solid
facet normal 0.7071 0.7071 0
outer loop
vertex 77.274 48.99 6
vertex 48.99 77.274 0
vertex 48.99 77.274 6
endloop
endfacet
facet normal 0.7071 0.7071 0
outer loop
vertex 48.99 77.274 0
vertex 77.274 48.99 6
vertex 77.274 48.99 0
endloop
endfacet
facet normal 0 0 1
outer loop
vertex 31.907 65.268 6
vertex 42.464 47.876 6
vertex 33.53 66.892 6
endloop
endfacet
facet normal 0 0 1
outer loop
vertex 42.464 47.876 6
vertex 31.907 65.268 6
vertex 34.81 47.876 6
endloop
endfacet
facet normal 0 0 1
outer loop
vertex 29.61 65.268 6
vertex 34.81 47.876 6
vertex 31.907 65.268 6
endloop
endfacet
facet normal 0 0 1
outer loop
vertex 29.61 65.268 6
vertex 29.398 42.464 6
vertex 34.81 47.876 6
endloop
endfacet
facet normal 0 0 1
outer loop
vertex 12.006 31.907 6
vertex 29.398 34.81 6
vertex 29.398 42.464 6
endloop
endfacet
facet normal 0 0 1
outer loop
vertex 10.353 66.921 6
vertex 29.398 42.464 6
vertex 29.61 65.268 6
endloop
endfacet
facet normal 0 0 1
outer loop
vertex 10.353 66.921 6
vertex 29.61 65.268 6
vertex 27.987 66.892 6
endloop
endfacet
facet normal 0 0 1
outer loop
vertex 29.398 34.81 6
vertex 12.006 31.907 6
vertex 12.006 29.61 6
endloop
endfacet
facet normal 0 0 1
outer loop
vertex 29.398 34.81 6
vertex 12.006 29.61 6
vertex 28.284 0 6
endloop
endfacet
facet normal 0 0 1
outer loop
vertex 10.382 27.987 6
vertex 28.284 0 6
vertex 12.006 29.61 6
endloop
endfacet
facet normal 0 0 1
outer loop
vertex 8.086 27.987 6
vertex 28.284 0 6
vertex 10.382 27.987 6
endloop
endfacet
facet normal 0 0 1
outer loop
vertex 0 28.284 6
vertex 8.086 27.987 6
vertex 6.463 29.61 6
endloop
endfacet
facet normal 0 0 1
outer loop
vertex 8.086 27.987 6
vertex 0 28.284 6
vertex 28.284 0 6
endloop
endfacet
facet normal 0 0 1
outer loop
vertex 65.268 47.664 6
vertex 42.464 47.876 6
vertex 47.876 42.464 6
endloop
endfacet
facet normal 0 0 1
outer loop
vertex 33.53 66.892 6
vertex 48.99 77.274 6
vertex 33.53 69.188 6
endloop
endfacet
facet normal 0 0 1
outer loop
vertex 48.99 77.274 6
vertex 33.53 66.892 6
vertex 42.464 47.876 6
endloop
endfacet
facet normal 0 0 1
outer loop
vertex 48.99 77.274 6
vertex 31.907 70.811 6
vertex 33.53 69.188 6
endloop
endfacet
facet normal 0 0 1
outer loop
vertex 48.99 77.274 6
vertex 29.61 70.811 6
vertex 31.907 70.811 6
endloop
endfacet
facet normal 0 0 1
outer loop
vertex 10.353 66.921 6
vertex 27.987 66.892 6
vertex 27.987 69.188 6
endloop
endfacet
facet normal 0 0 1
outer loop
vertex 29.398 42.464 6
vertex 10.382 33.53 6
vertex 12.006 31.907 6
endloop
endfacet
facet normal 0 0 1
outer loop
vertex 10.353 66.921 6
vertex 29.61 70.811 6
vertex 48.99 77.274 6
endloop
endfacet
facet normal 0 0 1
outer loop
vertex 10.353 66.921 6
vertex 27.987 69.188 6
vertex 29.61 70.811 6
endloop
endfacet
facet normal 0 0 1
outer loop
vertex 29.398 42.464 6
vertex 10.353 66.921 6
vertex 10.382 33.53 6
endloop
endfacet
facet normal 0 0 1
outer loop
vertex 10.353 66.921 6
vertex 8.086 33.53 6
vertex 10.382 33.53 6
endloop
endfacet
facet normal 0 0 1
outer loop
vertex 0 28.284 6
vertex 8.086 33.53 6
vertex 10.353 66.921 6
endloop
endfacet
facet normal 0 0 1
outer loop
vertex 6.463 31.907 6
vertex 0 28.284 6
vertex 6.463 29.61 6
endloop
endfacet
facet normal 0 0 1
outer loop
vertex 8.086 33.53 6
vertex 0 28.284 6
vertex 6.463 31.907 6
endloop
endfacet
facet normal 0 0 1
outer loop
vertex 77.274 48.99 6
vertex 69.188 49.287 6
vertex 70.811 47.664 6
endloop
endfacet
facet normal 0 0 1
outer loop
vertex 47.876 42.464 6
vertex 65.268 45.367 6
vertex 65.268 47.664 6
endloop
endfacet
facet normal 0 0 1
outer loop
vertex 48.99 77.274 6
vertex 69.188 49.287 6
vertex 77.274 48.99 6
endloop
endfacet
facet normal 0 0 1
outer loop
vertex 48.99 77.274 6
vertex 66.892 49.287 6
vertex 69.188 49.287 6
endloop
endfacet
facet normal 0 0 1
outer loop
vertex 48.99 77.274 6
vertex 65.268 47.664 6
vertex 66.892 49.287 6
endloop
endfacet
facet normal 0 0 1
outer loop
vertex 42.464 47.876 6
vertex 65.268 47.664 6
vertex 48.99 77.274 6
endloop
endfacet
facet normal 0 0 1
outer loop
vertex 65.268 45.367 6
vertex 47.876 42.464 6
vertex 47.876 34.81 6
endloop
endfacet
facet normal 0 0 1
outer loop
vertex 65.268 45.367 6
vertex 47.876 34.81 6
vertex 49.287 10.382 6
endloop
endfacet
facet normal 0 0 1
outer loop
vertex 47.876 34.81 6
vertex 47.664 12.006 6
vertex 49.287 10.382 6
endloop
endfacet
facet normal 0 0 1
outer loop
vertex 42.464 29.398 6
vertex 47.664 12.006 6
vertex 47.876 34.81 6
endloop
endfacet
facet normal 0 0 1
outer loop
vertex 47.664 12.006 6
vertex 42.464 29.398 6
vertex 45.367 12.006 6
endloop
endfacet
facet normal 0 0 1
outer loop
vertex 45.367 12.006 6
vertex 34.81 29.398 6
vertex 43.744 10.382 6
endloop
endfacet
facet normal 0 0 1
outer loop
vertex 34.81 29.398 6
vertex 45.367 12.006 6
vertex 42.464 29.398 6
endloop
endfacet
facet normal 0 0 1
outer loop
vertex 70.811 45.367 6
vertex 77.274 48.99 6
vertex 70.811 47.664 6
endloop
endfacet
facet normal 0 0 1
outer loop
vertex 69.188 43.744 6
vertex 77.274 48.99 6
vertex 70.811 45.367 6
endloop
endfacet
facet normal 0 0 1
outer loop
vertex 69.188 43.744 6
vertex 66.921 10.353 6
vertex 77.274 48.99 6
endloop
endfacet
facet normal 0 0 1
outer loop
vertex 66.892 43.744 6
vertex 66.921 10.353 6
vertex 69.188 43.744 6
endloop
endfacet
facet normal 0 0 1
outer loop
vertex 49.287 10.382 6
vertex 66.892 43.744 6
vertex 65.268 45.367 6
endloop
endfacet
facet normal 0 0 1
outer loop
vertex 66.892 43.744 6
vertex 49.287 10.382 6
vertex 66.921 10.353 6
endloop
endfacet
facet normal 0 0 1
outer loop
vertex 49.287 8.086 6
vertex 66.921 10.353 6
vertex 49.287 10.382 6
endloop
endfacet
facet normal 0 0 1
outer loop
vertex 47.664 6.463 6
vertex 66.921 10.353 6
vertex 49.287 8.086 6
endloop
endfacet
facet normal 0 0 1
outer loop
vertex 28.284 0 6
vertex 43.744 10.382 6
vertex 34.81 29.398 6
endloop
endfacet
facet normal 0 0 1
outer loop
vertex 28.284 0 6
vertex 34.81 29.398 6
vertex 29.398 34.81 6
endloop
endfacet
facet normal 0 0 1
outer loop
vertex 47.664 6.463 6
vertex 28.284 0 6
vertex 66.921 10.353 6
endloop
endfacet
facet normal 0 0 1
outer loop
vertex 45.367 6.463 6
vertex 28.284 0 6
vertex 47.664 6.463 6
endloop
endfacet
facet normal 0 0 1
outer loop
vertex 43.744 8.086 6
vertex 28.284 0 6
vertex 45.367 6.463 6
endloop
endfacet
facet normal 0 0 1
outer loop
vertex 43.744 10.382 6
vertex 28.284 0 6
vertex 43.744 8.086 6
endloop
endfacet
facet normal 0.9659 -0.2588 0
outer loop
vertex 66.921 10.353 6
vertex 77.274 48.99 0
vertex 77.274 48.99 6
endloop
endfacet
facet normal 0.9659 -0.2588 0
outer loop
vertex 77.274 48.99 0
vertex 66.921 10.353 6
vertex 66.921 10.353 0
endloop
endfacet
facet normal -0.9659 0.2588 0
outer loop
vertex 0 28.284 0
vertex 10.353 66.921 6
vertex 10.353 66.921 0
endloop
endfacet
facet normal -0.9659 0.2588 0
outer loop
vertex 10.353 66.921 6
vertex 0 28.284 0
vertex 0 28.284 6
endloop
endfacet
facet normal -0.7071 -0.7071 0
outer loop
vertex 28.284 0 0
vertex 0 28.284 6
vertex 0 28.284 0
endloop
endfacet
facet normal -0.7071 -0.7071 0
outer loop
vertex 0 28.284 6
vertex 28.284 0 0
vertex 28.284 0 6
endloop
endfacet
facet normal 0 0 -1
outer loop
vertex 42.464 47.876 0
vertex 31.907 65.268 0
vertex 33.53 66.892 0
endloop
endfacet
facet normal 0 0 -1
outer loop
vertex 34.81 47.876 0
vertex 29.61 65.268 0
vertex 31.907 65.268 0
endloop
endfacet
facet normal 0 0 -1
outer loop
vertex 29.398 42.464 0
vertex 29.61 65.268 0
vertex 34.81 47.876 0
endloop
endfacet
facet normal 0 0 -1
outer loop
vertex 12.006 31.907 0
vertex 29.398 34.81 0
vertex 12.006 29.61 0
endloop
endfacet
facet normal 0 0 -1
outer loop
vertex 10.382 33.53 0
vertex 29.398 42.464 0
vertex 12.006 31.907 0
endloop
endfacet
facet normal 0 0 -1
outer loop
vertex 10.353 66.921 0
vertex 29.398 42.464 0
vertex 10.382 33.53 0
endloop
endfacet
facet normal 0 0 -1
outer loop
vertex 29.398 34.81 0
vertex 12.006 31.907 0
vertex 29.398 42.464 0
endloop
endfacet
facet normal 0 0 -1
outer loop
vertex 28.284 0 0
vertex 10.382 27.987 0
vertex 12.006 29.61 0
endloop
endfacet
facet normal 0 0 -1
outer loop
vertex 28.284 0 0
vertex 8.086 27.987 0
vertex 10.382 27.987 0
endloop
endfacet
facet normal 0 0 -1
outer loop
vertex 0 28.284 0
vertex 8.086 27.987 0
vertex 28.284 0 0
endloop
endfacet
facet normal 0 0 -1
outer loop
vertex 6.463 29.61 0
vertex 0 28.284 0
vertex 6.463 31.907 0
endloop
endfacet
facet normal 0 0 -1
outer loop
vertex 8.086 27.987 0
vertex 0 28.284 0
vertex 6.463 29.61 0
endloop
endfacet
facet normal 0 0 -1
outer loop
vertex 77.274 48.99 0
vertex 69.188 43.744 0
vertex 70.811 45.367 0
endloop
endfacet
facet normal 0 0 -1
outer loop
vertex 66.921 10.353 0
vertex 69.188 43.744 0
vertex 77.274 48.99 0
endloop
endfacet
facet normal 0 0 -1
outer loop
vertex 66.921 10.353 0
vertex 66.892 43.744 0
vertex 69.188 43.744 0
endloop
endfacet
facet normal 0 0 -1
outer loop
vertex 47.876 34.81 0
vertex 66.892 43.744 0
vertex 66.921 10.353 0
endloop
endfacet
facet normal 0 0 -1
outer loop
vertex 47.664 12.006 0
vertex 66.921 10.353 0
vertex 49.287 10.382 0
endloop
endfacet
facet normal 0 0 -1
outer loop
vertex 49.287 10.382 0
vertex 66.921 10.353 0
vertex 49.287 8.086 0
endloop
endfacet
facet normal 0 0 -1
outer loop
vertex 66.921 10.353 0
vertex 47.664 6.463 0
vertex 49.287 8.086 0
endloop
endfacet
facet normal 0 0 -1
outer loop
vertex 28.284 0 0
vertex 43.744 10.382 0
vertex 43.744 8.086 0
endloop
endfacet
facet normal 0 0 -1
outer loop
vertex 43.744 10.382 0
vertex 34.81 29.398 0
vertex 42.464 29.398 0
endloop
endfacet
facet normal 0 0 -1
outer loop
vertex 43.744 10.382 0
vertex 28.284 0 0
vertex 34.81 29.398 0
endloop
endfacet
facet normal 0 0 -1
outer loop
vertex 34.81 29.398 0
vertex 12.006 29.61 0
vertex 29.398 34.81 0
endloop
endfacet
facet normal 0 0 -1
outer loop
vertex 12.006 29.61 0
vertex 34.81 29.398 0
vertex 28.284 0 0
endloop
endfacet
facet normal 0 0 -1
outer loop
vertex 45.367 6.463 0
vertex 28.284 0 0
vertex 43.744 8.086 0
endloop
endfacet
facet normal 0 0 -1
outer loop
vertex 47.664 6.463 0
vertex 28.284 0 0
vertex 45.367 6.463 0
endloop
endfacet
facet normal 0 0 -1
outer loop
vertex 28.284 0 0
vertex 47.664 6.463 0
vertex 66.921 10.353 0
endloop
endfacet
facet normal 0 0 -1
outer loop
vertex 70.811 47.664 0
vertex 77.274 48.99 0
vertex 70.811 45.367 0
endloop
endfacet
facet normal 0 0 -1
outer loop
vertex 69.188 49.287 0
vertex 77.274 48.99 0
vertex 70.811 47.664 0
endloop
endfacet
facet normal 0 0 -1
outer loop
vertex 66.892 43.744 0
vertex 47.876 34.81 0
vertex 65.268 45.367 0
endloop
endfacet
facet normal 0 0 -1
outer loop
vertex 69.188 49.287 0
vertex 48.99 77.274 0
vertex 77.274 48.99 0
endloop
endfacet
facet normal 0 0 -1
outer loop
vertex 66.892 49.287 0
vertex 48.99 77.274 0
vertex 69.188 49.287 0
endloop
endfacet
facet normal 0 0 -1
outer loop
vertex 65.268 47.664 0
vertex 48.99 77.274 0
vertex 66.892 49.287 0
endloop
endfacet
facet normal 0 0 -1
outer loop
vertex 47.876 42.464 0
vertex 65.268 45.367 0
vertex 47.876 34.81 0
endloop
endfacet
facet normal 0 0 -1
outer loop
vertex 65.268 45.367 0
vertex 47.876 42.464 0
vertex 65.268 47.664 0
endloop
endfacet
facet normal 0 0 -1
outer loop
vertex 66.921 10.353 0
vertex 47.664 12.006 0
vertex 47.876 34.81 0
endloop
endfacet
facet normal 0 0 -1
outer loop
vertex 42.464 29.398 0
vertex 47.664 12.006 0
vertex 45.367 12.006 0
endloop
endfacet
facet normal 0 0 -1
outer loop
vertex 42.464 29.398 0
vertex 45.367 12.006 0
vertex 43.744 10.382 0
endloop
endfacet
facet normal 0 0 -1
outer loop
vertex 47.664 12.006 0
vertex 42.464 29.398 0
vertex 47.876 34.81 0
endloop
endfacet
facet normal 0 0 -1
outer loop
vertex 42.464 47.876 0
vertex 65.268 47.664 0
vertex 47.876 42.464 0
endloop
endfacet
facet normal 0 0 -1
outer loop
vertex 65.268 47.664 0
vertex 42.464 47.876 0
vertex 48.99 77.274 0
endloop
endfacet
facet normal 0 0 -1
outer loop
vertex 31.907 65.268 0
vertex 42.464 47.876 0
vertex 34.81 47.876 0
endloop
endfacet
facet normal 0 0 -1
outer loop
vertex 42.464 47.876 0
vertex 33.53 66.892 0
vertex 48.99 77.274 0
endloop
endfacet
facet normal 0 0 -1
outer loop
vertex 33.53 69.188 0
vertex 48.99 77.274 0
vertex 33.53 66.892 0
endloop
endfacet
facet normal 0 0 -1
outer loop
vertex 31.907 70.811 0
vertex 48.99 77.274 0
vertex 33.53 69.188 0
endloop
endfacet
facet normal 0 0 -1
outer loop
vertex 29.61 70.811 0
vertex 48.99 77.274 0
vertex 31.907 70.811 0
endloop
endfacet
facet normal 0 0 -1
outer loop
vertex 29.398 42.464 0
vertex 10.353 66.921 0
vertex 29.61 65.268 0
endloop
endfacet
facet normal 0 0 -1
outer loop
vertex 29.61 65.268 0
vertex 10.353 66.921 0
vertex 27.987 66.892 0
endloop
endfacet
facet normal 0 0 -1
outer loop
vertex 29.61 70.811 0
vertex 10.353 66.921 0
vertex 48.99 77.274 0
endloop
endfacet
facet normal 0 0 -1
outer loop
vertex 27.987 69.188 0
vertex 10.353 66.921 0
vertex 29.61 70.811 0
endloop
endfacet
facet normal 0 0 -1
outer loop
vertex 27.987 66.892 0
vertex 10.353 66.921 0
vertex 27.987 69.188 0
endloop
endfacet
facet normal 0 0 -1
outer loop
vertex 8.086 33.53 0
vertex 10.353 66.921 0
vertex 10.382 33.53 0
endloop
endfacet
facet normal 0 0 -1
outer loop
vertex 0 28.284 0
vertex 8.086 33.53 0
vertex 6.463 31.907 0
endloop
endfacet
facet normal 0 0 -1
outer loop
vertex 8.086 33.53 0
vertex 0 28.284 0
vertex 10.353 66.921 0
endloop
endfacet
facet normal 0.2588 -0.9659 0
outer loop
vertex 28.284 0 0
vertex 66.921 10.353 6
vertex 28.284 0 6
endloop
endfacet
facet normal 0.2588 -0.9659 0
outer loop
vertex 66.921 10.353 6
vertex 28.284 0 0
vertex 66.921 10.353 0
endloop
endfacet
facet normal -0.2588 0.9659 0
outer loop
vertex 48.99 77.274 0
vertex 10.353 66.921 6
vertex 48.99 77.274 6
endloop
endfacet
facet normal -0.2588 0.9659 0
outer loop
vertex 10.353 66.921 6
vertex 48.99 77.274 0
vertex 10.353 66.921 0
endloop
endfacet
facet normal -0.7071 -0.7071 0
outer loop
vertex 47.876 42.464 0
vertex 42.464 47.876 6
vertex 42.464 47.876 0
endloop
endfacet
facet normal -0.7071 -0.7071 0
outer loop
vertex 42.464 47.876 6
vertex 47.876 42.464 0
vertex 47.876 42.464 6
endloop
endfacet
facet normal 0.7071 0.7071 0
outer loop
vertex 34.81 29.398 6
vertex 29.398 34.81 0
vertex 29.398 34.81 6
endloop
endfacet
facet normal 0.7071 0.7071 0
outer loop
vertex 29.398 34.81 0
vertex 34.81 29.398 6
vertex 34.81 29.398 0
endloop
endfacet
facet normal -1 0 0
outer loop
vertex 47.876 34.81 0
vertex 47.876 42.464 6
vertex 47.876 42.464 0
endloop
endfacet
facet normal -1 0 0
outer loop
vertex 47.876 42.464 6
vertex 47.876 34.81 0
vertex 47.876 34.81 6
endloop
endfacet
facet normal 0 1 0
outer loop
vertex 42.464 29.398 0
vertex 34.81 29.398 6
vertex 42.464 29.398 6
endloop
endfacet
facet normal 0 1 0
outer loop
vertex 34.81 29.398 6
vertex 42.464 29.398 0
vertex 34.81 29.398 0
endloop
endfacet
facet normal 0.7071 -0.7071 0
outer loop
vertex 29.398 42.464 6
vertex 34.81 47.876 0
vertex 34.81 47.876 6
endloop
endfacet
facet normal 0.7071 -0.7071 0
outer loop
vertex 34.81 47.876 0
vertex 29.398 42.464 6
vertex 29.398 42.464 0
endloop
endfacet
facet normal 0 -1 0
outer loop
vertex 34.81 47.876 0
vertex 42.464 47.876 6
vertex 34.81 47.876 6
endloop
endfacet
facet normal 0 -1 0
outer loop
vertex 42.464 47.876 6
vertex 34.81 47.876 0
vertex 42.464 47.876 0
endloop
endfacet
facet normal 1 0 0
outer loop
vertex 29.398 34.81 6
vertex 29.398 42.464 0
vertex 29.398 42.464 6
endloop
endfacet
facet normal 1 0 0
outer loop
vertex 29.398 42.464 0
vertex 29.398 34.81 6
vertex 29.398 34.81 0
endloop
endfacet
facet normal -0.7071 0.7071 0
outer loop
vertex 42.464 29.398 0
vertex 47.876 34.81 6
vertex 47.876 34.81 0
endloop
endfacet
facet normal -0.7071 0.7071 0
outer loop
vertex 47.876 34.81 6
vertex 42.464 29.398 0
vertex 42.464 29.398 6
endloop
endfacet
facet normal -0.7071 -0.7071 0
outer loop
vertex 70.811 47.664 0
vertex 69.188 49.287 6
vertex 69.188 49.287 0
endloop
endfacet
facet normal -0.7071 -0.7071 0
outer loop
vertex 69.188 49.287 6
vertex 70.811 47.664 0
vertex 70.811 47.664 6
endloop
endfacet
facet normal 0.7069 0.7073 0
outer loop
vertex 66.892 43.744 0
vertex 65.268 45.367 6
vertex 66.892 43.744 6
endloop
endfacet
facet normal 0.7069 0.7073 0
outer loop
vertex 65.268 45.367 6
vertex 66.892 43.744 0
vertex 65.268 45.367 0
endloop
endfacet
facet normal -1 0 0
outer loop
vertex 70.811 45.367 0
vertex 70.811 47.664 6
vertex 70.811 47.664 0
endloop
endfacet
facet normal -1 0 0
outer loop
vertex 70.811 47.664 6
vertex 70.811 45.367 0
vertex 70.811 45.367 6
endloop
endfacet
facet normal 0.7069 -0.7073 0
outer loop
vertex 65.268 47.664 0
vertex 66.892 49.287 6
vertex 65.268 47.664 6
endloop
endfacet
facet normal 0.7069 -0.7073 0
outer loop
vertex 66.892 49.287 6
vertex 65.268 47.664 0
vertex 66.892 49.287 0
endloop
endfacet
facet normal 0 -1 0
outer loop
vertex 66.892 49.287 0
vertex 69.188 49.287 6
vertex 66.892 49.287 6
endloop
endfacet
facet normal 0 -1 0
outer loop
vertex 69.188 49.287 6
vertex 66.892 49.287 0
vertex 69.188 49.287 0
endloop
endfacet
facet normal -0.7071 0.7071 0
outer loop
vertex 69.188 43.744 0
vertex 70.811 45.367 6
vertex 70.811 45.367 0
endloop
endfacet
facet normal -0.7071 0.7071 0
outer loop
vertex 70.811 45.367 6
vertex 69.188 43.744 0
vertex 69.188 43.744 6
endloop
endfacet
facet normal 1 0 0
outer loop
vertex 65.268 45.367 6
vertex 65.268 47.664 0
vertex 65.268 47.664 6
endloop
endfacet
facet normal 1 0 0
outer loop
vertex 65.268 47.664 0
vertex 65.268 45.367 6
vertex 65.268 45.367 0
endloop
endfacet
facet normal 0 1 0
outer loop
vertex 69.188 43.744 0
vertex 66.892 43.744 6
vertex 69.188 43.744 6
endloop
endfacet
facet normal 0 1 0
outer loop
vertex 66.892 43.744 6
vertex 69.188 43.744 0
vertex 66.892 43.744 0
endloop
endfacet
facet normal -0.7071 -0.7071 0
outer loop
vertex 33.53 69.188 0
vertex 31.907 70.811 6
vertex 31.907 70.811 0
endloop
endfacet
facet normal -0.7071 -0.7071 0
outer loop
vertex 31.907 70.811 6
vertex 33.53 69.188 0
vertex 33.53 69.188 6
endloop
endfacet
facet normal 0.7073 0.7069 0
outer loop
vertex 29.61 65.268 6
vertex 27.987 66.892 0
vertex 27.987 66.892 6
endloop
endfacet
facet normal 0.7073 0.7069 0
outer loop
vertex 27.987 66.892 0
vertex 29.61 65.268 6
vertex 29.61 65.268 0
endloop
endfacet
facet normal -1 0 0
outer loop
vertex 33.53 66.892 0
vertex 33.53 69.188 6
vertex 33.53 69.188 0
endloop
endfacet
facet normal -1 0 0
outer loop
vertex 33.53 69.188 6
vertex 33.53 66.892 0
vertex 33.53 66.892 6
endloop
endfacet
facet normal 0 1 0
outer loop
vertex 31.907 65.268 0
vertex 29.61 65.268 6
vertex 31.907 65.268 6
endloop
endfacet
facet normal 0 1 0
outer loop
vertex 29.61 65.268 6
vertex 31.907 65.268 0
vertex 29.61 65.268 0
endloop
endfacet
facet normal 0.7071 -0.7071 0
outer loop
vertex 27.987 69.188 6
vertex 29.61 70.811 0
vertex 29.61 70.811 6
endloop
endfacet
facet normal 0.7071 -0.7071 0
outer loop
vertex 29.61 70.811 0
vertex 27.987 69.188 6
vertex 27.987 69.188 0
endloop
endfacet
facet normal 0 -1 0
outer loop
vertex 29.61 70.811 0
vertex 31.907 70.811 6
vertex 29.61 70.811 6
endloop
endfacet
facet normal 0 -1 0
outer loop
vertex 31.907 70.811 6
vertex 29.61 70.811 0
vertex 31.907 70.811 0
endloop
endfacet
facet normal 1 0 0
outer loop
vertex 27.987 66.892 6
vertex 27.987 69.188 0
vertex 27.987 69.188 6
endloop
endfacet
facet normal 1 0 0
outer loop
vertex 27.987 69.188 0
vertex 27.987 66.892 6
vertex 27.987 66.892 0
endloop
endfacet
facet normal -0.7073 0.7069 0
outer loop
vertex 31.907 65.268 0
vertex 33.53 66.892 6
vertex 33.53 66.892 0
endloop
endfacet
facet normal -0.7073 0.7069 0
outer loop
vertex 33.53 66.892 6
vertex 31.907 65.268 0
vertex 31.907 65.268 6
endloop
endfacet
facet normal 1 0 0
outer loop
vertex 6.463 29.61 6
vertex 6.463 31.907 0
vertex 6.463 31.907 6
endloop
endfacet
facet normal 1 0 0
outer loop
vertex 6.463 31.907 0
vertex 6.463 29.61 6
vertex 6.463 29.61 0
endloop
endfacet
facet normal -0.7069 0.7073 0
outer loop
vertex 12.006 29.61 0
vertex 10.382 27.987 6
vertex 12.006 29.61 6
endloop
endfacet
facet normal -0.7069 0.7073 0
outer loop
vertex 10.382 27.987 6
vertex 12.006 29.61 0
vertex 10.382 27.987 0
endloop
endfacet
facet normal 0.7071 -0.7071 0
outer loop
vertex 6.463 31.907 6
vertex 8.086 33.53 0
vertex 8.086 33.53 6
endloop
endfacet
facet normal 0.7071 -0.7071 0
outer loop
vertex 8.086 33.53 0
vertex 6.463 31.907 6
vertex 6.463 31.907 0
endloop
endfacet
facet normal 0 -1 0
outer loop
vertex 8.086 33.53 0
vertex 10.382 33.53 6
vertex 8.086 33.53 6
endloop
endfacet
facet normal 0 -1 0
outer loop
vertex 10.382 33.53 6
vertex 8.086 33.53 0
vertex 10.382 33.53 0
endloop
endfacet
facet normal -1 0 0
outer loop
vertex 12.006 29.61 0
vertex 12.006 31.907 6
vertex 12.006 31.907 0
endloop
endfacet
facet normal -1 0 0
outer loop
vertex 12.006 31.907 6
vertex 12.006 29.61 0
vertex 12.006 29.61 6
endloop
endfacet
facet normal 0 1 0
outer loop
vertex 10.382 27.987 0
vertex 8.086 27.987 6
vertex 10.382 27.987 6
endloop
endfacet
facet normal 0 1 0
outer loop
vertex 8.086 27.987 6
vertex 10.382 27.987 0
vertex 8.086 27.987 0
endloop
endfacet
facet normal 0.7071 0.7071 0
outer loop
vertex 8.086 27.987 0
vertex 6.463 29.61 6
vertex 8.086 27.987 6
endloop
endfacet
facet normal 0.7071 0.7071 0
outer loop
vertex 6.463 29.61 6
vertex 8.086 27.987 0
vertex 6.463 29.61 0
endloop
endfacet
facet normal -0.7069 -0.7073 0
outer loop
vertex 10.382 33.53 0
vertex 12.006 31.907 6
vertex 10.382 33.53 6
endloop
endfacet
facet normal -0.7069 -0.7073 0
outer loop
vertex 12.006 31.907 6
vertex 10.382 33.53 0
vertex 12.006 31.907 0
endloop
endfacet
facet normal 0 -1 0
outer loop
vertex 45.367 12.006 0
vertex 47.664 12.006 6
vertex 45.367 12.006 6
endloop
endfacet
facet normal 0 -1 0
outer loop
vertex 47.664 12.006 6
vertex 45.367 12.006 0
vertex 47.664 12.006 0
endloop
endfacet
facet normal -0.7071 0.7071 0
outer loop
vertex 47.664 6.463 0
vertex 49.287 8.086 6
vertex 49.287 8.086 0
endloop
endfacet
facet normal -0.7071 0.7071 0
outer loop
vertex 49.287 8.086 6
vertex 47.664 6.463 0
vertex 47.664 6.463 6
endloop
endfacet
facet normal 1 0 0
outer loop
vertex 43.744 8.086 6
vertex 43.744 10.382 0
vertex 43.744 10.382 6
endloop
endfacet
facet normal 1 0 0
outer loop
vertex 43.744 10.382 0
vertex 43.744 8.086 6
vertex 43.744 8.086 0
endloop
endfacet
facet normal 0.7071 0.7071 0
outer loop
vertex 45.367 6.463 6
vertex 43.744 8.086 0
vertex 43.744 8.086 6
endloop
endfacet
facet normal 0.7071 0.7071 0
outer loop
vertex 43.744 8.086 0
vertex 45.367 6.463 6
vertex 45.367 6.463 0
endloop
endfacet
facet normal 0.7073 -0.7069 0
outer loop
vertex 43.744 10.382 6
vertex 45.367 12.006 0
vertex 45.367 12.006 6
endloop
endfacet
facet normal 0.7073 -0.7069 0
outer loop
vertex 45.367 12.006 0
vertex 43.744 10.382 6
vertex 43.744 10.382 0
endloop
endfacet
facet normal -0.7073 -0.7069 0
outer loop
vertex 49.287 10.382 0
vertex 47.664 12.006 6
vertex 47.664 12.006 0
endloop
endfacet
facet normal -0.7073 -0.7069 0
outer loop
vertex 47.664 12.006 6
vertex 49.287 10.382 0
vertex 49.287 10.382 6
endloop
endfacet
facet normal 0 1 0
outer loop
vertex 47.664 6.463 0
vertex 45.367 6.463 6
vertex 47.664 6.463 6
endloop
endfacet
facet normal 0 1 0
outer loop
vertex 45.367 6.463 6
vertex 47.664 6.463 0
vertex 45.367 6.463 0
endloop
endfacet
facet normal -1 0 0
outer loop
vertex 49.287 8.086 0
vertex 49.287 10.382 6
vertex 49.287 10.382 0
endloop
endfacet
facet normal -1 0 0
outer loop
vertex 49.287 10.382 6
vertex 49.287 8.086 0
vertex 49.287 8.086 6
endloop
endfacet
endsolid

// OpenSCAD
$fn = 32;

// ----------------------------------------------------------------------
// Polygon plate: 6-gon R40, 4 bolt windows
// ----------------------------------------------------------------------

// --- parameters (mm) ---
sides = 6;                // number of polygon sides
plate_r = 40;             // circumscribed radius of the polygon
bore_r = 10;              // centre bore radius
bolts = 4;                // number of bolt windows
ring_r = 30.44;           // bolt-circle radius
bolt_r = 3;               // bolt window radius
plate_t = 6;              // plate thickness, Z (extrusion height)

plate_d = 2 * plate_r;  // circumscribed diameter
bore_d = 2 * bore_r;  // centre bore diameter
bolt_d = 2 * bolt_r;  // bolt window diameter
ring_d = 2 * ring_r;  // bolt-circle diameter

profile = [[77.274, 48.99], [48.99, 77.274], [10.353, 66.921], [0, 28.284], [28.284, 0], [66.921, 10.353]];  // primary outline, 6 points, counter clockwise
void_1 = [[47.876, 42.464], [42.464, 47.876], [34.81, 47.876], [29.398, 42.464], [29.398, 34.81], [34.81, 29.398], [42.464, 29.398], [47.876, 34.81]];  // centre bore, 8 points
void_2 = [[70.811, 47.664], [69.188, 49.287], [66.892, 49.287], [65.268, 47.664], [65.268, 45.367], [66.892, 43.744], [69.188, 43.744], [70.811, 45.367]];  // bolt window 1, 8 points
void_3 = [[33.53, 69.188], [31.907, 70.811], [29.61, 70.811], [27.987, 69.188], [27.987, 66.892], [29.61, 65.268], [31.907, 65.268], [33.53, 66.892]];  // bolt window 2, 8 points
void_4 = [[12.006, 31.907], [10.382, 33.53], [8.086, 33.53], [6.463, 31.907], [6.463, 29.61], [8.086, 27.987], [10.382, 27.987], [12.006, 29.61]];  // bolt window 3, 8 points
void_5 = [[49.287, 10.382], [47.664, 12.006], [45.367, 12.006], [43.744, 10.382], [43.744, 8.086], [45.367, 6.463], [47.664, 6.463], [49.287, 8.086]];  // bolt window 4, 8 points

// --- the one profile operation ---
difference() {
  linear_extrude(height = plate_t) polygon(points = profile);
  translate([0, 0, -1])
    linear_extrude(height = plate_t + 2) polygon(points = void_1);
  translate([0, 0, -1])
    linear_extrude(height = plate_t + 2) polygon(points = void_2);
  translate([0, 0, -1])
    linear_extrude(height = plate_t + 2) polygon(points = void_3);
  translate([0, 0, -1])
    linear_extrude(height = plate_t + 2) polygon(points = void_4);
  translate([0, 0, -1])
    linear_extrude(height = plate_t + 2) polygon(points = void_5);
}
